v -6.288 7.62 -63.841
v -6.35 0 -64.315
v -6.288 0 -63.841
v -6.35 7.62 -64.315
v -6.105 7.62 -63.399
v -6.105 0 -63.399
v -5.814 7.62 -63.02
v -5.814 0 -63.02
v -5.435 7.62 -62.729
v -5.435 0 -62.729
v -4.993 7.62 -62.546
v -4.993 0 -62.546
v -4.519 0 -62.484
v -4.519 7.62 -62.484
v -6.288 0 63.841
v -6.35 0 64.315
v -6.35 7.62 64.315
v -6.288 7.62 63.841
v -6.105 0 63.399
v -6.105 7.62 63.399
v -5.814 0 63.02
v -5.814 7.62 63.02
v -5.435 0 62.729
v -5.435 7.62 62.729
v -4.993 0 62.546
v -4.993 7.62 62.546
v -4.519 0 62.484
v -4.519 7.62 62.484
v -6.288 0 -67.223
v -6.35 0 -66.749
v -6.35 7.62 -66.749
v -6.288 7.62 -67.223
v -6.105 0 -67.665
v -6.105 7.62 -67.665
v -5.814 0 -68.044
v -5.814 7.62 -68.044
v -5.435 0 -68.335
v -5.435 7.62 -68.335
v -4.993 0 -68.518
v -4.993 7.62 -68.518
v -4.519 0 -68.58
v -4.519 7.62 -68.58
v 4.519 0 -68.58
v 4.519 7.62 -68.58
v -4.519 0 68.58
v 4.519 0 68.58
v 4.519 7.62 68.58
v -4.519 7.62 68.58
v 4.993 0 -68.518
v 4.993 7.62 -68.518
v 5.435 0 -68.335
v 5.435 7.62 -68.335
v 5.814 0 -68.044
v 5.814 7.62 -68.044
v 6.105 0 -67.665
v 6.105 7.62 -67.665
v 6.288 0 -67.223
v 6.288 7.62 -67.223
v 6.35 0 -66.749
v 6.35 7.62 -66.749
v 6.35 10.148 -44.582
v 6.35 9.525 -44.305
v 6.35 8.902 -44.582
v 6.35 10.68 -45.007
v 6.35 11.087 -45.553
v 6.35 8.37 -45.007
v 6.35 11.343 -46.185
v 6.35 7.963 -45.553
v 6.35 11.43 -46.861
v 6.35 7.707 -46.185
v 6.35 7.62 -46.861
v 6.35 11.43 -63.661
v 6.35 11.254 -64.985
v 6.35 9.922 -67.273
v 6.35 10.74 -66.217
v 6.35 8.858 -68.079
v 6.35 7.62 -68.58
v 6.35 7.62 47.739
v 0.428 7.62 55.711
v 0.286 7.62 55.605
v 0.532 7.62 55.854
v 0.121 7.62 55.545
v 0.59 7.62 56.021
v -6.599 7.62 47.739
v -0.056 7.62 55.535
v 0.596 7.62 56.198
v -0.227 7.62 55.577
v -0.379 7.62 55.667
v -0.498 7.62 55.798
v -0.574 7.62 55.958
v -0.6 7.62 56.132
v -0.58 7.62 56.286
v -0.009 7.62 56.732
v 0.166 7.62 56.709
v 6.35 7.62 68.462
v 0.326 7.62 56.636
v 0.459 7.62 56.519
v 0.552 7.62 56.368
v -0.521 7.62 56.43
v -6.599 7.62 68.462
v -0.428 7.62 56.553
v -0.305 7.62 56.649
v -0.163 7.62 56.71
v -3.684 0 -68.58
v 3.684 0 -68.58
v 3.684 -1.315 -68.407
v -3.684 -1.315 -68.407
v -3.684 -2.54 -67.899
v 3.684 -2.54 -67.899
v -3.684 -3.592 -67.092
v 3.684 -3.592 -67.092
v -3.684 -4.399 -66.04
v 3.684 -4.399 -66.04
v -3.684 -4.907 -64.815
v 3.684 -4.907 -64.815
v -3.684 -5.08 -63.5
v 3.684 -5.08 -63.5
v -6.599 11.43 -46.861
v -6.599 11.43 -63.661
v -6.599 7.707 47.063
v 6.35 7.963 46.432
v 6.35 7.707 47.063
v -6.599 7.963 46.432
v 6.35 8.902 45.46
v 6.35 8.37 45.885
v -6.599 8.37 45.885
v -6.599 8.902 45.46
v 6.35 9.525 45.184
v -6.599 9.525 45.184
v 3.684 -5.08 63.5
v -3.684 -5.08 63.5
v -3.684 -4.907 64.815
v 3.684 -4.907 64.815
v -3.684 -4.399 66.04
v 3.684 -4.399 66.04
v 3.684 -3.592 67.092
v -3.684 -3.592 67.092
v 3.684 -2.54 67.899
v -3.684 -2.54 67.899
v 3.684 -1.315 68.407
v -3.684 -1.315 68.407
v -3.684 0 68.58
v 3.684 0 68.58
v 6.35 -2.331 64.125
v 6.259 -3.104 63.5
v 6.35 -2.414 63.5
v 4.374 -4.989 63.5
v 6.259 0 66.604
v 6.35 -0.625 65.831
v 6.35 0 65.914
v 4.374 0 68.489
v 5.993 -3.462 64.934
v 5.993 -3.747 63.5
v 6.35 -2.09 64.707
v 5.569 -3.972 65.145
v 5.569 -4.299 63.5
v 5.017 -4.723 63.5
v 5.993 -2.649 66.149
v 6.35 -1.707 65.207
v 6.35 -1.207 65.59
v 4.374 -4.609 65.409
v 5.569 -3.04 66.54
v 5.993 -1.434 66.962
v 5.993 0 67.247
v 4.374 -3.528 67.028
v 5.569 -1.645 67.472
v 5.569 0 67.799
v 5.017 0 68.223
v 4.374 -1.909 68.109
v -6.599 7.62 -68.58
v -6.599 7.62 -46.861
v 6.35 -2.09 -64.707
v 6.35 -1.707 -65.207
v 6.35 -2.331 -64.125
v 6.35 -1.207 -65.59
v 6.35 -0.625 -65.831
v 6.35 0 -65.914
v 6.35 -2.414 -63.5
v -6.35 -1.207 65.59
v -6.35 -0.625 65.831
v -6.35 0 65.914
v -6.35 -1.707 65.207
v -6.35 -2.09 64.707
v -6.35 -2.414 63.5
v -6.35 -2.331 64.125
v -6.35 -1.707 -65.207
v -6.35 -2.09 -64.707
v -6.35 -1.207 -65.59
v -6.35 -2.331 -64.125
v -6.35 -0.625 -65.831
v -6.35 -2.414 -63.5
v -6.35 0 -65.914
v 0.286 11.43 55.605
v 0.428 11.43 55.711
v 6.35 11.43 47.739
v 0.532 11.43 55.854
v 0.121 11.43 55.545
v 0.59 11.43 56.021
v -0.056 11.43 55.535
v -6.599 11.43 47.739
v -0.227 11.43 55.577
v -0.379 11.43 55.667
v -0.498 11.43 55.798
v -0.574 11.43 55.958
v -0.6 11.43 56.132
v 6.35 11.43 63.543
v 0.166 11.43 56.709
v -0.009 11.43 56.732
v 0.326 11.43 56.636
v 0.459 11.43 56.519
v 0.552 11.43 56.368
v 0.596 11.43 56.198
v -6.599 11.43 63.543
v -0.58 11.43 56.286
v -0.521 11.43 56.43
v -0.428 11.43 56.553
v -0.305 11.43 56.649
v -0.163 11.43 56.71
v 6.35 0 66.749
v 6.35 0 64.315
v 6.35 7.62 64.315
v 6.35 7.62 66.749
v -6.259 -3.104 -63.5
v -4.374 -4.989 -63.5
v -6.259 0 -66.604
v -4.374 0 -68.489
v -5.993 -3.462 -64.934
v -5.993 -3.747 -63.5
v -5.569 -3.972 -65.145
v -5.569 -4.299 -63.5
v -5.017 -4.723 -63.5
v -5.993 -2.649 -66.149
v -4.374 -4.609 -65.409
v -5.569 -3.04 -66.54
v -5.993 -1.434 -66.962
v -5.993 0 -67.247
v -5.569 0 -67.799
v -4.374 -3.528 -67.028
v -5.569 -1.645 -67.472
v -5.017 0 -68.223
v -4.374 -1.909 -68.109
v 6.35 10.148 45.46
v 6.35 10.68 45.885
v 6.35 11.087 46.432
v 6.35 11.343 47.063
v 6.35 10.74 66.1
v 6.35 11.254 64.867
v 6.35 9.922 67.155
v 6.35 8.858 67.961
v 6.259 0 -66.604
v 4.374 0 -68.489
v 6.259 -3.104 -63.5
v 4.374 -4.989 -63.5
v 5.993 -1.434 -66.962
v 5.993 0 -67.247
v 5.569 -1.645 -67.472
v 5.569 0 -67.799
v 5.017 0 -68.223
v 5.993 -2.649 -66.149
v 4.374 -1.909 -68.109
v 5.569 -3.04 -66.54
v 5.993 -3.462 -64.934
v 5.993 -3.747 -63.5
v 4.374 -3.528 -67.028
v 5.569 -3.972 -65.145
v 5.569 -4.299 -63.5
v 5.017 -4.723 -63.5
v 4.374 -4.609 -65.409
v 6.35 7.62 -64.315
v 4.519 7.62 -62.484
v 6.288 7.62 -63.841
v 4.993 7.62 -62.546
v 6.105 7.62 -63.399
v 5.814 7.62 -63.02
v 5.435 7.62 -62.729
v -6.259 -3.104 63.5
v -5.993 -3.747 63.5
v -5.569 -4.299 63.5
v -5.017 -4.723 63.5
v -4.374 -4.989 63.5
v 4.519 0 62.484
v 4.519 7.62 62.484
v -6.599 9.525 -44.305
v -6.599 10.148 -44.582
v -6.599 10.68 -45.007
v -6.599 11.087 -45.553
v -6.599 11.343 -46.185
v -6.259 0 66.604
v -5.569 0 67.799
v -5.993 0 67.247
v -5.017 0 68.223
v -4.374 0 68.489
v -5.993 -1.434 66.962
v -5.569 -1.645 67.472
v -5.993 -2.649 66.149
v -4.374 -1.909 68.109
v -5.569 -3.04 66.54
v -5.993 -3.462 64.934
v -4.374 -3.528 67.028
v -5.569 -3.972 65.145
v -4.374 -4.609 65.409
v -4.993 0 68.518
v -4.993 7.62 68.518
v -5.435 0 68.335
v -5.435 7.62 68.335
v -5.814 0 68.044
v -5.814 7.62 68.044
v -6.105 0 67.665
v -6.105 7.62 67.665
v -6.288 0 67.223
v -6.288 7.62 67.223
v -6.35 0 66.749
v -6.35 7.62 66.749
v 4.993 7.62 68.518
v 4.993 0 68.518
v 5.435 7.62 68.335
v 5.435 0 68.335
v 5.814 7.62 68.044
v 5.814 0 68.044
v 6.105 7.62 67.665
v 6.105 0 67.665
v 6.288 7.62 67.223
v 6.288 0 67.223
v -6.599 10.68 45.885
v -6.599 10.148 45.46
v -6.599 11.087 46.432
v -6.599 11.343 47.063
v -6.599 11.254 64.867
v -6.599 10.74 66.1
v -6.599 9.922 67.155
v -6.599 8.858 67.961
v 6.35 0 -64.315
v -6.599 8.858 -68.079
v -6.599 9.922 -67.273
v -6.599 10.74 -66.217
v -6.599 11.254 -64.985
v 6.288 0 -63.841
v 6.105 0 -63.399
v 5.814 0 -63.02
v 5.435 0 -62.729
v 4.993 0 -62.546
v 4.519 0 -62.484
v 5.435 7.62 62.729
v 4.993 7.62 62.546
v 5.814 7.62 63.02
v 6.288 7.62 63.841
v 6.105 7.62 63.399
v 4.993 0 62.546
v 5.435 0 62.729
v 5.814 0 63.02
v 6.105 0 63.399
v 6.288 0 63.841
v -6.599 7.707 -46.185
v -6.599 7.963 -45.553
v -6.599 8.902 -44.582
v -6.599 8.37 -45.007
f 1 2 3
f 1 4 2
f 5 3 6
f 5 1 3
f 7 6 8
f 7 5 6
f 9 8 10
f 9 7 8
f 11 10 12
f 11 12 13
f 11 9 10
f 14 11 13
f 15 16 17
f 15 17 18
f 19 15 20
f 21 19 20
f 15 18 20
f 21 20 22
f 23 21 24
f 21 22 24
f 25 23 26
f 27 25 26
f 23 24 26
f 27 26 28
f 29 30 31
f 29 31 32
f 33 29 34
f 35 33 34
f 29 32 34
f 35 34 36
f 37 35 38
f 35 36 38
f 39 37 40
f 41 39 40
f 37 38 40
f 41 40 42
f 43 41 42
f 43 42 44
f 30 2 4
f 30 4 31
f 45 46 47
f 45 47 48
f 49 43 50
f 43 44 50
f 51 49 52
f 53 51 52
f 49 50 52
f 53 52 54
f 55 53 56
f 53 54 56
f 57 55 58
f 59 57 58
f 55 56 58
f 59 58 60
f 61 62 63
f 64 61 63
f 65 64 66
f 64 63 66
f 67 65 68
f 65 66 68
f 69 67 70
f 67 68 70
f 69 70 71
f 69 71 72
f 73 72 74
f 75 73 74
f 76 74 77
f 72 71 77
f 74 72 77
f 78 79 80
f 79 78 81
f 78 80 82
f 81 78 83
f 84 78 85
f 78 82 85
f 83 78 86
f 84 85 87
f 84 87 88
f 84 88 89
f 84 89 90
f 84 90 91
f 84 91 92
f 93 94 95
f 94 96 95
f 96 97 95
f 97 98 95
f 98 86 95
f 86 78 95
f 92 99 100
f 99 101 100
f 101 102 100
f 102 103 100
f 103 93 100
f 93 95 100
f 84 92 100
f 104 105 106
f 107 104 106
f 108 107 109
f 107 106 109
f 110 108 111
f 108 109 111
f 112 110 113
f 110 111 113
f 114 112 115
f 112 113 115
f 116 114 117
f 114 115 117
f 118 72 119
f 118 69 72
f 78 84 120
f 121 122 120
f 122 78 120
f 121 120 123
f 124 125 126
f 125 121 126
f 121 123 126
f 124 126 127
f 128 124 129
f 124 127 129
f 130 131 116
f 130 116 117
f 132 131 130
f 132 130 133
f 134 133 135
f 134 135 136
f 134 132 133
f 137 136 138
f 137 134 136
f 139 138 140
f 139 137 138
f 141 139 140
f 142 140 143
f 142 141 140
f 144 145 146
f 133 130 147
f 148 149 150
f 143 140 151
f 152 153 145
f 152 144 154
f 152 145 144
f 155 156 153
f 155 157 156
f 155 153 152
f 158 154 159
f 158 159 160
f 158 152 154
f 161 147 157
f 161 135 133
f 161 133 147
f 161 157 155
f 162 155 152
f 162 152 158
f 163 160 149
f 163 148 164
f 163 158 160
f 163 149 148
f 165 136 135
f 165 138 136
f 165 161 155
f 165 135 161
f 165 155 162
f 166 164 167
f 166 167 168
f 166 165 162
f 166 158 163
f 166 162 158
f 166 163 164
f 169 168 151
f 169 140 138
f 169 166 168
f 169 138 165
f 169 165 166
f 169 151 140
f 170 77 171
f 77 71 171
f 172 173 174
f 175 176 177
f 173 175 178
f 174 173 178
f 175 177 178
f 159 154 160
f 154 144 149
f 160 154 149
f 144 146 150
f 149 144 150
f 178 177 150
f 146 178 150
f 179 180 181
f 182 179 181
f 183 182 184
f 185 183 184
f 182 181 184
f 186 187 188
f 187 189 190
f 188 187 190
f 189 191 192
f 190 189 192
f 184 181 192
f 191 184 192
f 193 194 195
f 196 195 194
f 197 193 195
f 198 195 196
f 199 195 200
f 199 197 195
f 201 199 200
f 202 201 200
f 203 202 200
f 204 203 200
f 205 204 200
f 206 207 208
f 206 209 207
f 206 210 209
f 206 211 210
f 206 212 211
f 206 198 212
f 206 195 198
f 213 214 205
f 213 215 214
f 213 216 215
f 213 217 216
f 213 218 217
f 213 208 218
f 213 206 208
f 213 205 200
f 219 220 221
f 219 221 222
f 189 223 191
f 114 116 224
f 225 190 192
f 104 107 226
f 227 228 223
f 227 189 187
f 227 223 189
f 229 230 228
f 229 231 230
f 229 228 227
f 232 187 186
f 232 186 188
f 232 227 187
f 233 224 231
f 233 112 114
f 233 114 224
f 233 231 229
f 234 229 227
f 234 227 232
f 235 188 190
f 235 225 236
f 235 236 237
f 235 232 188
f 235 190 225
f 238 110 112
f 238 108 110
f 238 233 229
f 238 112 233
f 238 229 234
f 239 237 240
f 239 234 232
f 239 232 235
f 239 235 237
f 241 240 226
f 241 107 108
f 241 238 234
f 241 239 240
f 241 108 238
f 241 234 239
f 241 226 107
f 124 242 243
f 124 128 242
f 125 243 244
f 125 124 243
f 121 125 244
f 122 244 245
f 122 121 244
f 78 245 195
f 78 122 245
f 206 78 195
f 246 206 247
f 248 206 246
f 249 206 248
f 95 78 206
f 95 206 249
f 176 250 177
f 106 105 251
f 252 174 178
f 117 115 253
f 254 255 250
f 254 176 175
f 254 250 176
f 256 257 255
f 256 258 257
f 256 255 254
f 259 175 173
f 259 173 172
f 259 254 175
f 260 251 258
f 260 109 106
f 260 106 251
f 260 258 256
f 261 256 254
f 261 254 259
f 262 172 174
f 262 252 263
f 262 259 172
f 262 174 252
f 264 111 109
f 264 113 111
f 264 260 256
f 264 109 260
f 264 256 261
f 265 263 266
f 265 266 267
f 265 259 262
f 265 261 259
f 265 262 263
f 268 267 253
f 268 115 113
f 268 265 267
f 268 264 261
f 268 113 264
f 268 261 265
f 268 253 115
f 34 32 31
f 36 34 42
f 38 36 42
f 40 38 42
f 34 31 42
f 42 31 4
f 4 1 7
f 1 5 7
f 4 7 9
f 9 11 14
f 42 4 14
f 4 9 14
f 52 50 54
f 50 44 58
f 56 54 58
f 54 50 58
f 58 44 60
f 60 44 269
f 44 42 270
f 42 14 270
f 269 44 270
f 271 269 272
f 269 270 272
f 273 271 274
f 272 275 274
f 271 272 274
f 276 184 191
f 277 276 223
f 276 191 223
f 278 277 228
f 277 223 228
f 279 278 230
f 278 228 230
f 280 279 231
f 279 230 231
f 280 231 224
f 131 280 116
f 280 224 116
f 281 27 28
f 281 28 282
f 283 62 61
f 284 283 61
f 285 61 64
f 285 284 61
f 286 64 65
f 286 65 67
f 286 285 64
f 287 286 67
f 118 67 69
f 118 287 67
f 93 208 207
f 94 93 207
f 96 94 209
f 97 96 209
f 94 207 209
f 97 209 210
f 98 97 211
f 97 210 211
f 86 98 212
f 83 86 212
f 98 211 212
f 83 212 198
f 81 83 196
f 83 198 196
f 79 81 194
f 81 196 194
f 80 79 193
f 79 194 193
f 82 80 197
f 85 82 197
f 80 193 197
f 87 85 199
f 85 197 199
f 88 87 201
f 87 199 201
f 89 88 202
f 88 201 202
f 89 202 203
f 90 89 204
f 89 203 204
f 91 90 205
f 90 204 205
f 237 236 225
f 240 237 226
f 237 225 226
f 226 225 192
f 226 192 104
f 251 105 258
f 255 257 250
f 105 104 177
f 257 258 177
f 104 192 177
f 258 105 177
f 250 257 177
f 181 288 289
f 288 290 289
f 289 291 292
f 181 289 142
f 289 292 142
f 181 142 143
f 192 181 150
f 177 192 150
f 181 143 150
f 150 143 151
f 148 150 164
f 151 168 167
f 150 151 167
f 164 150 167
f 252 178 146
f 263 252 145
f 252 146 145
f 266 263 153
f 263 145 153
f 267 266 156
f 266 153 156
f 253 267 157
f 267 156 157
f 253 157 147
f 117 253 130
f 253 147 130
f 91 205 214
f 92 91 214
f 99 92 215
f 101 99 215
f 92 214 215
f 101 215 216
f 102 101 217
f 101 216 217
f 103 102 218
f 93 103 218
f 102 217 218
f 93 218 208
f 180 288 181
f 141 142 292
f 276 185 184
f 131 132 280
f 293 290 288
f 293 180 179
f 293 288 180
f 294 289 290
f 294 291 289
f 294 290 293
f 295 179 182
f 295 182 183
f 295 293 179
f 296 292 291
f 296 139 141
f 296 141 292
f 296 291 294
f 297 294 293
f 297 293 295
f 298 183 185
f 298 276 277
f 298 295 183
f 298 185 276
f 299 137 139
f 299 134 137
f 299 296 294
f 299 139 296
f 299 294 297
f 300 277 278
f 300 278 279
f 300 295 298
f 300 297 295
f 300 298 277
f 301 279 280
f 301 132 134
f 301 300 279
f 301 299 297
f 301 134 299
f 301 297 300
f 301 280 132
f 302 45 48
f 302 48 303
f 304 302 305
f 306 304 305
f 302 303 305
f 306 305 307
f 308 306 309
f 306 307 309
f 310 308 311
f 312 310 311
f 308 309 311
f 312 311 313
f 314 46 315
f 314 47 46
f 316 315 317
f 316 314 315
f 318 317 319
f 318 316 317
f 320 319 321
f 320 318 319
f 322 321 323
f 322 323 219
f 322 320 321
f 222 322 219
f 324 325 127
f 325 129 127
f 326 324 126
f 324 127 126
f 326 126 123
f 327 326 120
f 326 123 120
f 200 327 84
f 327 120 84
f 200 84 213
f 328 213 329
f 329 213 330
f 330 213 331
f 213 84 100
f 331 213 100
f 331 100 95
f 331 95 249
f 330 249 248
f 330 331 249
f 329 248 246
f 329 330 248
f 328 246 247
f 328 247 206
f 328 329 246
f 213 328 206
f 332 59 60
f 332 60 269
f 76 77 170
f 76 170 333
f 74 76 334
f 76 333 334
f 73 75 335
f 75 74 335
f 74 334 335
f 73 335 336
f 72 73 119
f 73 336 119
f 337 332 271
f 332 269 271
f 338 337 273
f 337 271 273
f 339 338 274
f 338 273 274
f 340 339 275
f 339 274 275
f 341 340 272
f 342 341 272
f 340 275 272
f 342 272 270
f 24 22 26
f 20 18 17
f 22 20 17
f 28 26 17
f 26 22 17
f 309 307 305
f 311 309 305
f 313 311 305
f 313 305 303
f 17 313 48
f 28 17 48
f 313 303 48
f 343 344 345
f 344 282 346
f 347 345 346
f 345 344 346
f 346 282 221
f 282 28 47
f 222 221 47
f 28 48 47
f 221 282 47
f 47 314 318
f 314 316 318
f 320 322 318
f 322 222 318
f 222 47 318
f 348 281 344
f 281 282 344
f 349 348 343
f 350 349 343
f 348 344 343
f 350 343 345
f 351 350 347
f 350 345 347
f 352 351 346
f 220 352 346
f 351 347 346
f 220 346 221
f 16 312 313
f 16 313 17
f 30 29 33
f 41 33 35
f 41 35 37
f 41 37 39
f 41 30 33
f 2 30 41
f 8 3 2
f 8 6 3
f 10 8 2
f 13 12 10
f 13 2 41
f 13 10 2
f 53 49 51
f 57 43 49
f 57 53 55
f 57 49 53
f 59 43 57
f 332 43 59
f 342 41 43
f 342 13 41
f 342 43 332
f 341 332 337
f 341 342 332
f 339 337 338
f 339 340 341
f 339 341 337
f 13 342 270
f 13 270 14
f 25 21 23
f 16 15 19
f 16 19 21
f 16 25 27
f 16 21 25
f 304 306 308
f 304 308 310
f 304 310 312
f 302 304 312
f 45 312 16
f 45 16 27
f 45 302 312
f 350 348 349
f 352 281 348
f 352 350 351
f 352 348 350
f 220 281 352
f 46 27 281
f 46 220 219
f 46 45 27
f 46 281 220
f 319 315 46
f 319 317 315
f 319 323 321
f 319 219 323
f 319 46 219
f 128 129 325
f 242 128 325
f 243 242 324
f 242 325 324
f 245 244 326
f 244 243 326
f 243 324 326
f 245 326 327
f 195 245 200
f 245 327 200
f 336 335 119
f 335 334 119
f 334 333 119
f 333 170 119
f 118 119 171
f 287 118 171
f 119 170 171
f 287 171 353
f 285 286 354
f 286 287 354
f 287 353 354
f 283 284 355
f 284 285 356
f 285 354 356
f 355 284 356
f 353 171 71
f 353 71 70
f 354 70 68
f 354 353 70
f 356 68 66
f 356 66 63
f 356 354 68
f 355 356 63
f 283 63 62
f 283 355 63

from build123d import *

# Parameters (mm, degrees)
F1_DEPTH      = 7.62
F0_W          = 6.35
F0_H          = 124.968
F2_DEPTH      = 5.08
F3_W          = 12.7
F3_H          = 6.096
F4_DEPTH      = 3.81
F3_W_2        = 12.9487617709
F3_H_2        = 23.389633745
F6_DEPTH      = 25.4
F7_F1_R       = 5.0799
F7_F2_R       = 5.0799
F7_2_T1_DEPTH = 37.5422060193
F7_3_T1_DEPTH = 37.5422060193
F8_F1_R       = 2.6664988796
F8_F2_R       = 2.6664988796
F8_2_T1_DEPTH = 26.2812561691
F8_3_T1_DEPTH = 26.2812561691
F9_R          = 1.8309637078
F9_2_R        = 1.8309637078


# Not quite as in the source:
# - a fillet or chamfer that OpenCascade refuses, or shapes differently, is made with other operations: its cross-section is extruded or revolved along the edge and cut away or added
# - a fillet or chamfer is up to 0.001 mm smaller than in the source, because OpenCascade refuses the exact size


with BuildPart() as f1:
    # F0 (on Front) → F1 (new body)
    with BuildSketch(Plane.XZ):
        Polygon((0, -62.484), (-6.35, -62.484), (-6.35, -68.58), (6.35, -68.58), (6.35, -62.484), align=None)
    extrude(amount=-F1_DEPTH)

    # F9
    f9_edges = [f1.edges().sort_by_distance(p)[0] for p in [
        (6.35, 3.81, -68.58),
        (6.35, 3.81, -62.484),
        (-6.35, 3.81, -62.484),
        (-6.35, 3.81, -68.58),
    ]]
    fillet(f9_edges, radius=F9_R)


with BuildPart() as f1b:
    # F0 (on Front) → F1, piece 2 (new body)
    with BuildSketch(Plane.XZ):
        Polygon((6.35, 68.58), (-6.35, 68.58), (-6.35, 62.484), (0, 62.484), (6.35, 62.484), align=None)
    extrude(amount=-F1_DEPTH)

    # F9#2
    f9_2_edges = [f1b.edges().sort_by_distance(p)[0] for p in [
        (6.35, 3.81, 68.58),
        (-6.35, 3.81, 68.58),
        (6.35, 3.81, 62.484),
        (-6.35, 3.81, 62.484),
    ]]
    fillet(f9_2_edges, radius=F9_2_R)


with BuildPart() as f2:
    # F0 (on Front) → F2 (new body)
    with BuildSketch(Plane.XZ):
        with Locations((3.175, 0)):
            Rectangle(F0_W, F0_H)
        with Locations((-3.175, 0)):
            Rectangle(F0_W, F0_H)
        Polygon((0, -62.484), (-6.35, -62.484), (-6.35, -68.58), (6.35, -68.58), (6.35, -62.484), align=None)
        Polygon((6.35, 68.58), (-6.35, 68.58), (-6.35, 62.484), (0, 62.484), (6.35, 62.484), align=None)
    extrude(amount=F2_DEPTH)

    # F7: fillet of radius 5.08 on 2 edges, made by hand

    # F7_f1 (radius 5.08 in the source; OpenCascade refuses exactly that, so slightly less here)
    f7_f1_edges = [f2.edges().sort_by_distance(p)[0] for p in [
        (0, -5.08, -68.58),
    ]]
    fillet(f7_f1_edges, radius=F7_F1_R)

    # F7_f2 (radius 5.08 in the source; OpenCascade refuses exactly that, so slightly less here)
    f7_f2_edges = [f2.edges().sort_by_distance(p)[0] for p in [
        (0, -5.08, 68.58),
    ]]
    fillet(f7_f2_edges, radius=F7_F2_R)

    # F8: fillet of radius 2.6664988796 on 10 edges, made by hand

    # F8_f1
    f8_f1_edges = [f2.edges().sort_by_distance(p)[0] for p in [
        (-6.35, -5.08, 0),
        (-6.35, -3.5921317377, 67.0921317377),
        (-6.35, -3.5921317377, -67.0921317377),
        (-6.35, -5e-05, 68.58),
        (-6.35, -5e-05, -68.58),
    ]]
    fillet(f8_f1_edges, radius=F8_F1_R)

    # F8_f2
    f8_f2_edges = [f2.edges().sort_by_distance(p)[0] for p in [
        (6.35, -5.08, 0),
        (6.35, -3.5921317377, 67.0921317377),
        (6.35, -3.5921317377, -67.0921317377),
        (6.35, -5e-05, 68.58),
        (6.35, -5e-05, -68.58),
    ]]
    fillet(f8_f2_edges, radius=F8_F2_R)


with BuildPart() as f4:
    # F3 (on face) → F4 (new body)
    with BuildSketch(Plane(origin=(0, 7.62, 0), x_dir=(-1, 0, 0), z_dir=(0, 1, 0))):
        Polygon((6.35, -62.484), (6.35, -68.58), (6.5987617709, -68.58), (6.5987617709, -44.1940687597), (-6.35, -44.1940687597), (-6.35, -62.484), align=None)
        with Locations((0, -65.532)):
            Rectangle(F3_W, F3_H)
    extrude(amount=F4_DEPTH)

    # F7#2: fillet of radius 5.08 on 1 edges, made by hand

    # F7_2_s2 → F7_2_t1 (cut)
    with BuildSketch(Plane.YZ.offset(-18.8954838951)):
        with BuildLine():
            ThreePointArc((7.62, -68.58), (10.3660926284, -66.7721631237), (11.43, -63.6613111503))
            Line((11.43, -63.6613111503), (11.43, -68.58))
            Line((11.43, -68.58), (7.62, -68.58))
        make_face()
    extrude(amount=F7_2_T1_DEPTH, mode=Mode.SUBTRACT)

    # F8#2: fillet of radius 2.6664988796 on 2 edges, made by hand

    # F8_2_s2 → F8_2_t1 (cut)
    with BuildSketch(Plane.YZ.offset(-13.26500897)):
        with BuildLine():
            ThreePointArc((8.7635011204, -44.1940687597), (10.6490005602, -44.9750681995), (11.43, -46.8605676393))
            Line((11.43, -46.8605676393), (11.43, -44.1940687597))
            Line((11.43, -44.1940687597), (8.7635011204, -44.1940687597))
        make_face()
        with BuildLine():
            ThreePointArc((7.62, -46.8605676393), (8.4009994398, -44.9750681995), (10.2864988796, -44.1940687597))
            Line((10.2864988796, -44.1940687597), (7.62, -44.1940687597))
            Line((7.62, -44.1940687597), (7.62, -46.8605676393))
        make_face()
    extrude(amount=F8_2_T1_DEPTH, mode=Mode.SUBTRACT)


with BuildPart() as f4b:
    # F3 (on face) → F4, piece 2 (new body)
    with BuildSketch(Plane(origin=(0, 7.62, 0), x_dir=(-1, 0, 0), z_dir=(0, 1, 0))):
        with Locations((0.1243808854, 56.7673463374)):
            Rectangle(F3_W_2, F3_H_2)
    extrude(amount=F4_DEPTH)

    # F5 (on face) → F6 (cut)
    with BuildSketch(Plane(origin=(0, 11.43, 0), x_dir=(-1, 0, 0), z_dir=(0, 1, 0))):
        with BuildLine():
            ThreePointArc((0.0093760507, 56.7322248993), (-0.427566153, 55.7113620808), (0.6, 56.1322981624))
            ThreePointArc((0.6, 56.1322981624), (0.427566153, 56.553234244), (0.0093760507, 56.7322248993))
        make_face()
    extrude(amount=-F6_DEPTH, mode=Mode.SUBTRACT)

    # F7#3: fillet of radius 5.08 on 1 edges, made by hand

    # F7_3_s2 → F7_3_t1 (cut)
    with BuildSketch(Plane.YZ.offset(-18.8954838951)):
        with BuildLine():
            ThreePointArc((7.62, 68.4621632099), (10.3660926284, 66.6543263336), (11.43, 63.5434743602))
            Line((11.43, 63.5434743602), (11.43, 68.4621632099))
            Line((11.43, 68.4621632099), (7.62, 68.4621632099))
        make_face()
    extrude(amount=F7_3_T1_DEPTH, mode=Mode.SUBTRACT)

    # F8#3: fillet of radius 2.6664988796 on 2 edges, made by hand

    # F8_3_s2 → F8_3_t1 (cut)
    with BuildSketch(Plane.YZ.offset(-13.26500897)):
        with BuildLine():
            ThreePointArc((8.7635011204, 45.072529465), (10.6490005602, 45.8535289048), (11.43, 47.7390283446))
            Line((11.43, 47.7390283446), (11.43, 45.072529465))
            Line((11.43, 45.072529465), (8.7635011204, 45.072529465))
        make_face()
        with BuildLine():
            ThreePointArc((7.62, 47.7390283446), (8.4009994398, 45.8535289048), (10.2864988796, 45.072529465))
            Line((10.2864988796, 45.072529465), (7.62, 45.072529465))
            Line((7.62, 45.072529465), (7.62, 47.7390283446))
        make_face()
    extrude(amount=F8_3_T1_DEPTH, mode=Mode.SUBTRACT)


solid = Compound([f1.part, f1b.part, f2.part, f4.part, f4b.part])
